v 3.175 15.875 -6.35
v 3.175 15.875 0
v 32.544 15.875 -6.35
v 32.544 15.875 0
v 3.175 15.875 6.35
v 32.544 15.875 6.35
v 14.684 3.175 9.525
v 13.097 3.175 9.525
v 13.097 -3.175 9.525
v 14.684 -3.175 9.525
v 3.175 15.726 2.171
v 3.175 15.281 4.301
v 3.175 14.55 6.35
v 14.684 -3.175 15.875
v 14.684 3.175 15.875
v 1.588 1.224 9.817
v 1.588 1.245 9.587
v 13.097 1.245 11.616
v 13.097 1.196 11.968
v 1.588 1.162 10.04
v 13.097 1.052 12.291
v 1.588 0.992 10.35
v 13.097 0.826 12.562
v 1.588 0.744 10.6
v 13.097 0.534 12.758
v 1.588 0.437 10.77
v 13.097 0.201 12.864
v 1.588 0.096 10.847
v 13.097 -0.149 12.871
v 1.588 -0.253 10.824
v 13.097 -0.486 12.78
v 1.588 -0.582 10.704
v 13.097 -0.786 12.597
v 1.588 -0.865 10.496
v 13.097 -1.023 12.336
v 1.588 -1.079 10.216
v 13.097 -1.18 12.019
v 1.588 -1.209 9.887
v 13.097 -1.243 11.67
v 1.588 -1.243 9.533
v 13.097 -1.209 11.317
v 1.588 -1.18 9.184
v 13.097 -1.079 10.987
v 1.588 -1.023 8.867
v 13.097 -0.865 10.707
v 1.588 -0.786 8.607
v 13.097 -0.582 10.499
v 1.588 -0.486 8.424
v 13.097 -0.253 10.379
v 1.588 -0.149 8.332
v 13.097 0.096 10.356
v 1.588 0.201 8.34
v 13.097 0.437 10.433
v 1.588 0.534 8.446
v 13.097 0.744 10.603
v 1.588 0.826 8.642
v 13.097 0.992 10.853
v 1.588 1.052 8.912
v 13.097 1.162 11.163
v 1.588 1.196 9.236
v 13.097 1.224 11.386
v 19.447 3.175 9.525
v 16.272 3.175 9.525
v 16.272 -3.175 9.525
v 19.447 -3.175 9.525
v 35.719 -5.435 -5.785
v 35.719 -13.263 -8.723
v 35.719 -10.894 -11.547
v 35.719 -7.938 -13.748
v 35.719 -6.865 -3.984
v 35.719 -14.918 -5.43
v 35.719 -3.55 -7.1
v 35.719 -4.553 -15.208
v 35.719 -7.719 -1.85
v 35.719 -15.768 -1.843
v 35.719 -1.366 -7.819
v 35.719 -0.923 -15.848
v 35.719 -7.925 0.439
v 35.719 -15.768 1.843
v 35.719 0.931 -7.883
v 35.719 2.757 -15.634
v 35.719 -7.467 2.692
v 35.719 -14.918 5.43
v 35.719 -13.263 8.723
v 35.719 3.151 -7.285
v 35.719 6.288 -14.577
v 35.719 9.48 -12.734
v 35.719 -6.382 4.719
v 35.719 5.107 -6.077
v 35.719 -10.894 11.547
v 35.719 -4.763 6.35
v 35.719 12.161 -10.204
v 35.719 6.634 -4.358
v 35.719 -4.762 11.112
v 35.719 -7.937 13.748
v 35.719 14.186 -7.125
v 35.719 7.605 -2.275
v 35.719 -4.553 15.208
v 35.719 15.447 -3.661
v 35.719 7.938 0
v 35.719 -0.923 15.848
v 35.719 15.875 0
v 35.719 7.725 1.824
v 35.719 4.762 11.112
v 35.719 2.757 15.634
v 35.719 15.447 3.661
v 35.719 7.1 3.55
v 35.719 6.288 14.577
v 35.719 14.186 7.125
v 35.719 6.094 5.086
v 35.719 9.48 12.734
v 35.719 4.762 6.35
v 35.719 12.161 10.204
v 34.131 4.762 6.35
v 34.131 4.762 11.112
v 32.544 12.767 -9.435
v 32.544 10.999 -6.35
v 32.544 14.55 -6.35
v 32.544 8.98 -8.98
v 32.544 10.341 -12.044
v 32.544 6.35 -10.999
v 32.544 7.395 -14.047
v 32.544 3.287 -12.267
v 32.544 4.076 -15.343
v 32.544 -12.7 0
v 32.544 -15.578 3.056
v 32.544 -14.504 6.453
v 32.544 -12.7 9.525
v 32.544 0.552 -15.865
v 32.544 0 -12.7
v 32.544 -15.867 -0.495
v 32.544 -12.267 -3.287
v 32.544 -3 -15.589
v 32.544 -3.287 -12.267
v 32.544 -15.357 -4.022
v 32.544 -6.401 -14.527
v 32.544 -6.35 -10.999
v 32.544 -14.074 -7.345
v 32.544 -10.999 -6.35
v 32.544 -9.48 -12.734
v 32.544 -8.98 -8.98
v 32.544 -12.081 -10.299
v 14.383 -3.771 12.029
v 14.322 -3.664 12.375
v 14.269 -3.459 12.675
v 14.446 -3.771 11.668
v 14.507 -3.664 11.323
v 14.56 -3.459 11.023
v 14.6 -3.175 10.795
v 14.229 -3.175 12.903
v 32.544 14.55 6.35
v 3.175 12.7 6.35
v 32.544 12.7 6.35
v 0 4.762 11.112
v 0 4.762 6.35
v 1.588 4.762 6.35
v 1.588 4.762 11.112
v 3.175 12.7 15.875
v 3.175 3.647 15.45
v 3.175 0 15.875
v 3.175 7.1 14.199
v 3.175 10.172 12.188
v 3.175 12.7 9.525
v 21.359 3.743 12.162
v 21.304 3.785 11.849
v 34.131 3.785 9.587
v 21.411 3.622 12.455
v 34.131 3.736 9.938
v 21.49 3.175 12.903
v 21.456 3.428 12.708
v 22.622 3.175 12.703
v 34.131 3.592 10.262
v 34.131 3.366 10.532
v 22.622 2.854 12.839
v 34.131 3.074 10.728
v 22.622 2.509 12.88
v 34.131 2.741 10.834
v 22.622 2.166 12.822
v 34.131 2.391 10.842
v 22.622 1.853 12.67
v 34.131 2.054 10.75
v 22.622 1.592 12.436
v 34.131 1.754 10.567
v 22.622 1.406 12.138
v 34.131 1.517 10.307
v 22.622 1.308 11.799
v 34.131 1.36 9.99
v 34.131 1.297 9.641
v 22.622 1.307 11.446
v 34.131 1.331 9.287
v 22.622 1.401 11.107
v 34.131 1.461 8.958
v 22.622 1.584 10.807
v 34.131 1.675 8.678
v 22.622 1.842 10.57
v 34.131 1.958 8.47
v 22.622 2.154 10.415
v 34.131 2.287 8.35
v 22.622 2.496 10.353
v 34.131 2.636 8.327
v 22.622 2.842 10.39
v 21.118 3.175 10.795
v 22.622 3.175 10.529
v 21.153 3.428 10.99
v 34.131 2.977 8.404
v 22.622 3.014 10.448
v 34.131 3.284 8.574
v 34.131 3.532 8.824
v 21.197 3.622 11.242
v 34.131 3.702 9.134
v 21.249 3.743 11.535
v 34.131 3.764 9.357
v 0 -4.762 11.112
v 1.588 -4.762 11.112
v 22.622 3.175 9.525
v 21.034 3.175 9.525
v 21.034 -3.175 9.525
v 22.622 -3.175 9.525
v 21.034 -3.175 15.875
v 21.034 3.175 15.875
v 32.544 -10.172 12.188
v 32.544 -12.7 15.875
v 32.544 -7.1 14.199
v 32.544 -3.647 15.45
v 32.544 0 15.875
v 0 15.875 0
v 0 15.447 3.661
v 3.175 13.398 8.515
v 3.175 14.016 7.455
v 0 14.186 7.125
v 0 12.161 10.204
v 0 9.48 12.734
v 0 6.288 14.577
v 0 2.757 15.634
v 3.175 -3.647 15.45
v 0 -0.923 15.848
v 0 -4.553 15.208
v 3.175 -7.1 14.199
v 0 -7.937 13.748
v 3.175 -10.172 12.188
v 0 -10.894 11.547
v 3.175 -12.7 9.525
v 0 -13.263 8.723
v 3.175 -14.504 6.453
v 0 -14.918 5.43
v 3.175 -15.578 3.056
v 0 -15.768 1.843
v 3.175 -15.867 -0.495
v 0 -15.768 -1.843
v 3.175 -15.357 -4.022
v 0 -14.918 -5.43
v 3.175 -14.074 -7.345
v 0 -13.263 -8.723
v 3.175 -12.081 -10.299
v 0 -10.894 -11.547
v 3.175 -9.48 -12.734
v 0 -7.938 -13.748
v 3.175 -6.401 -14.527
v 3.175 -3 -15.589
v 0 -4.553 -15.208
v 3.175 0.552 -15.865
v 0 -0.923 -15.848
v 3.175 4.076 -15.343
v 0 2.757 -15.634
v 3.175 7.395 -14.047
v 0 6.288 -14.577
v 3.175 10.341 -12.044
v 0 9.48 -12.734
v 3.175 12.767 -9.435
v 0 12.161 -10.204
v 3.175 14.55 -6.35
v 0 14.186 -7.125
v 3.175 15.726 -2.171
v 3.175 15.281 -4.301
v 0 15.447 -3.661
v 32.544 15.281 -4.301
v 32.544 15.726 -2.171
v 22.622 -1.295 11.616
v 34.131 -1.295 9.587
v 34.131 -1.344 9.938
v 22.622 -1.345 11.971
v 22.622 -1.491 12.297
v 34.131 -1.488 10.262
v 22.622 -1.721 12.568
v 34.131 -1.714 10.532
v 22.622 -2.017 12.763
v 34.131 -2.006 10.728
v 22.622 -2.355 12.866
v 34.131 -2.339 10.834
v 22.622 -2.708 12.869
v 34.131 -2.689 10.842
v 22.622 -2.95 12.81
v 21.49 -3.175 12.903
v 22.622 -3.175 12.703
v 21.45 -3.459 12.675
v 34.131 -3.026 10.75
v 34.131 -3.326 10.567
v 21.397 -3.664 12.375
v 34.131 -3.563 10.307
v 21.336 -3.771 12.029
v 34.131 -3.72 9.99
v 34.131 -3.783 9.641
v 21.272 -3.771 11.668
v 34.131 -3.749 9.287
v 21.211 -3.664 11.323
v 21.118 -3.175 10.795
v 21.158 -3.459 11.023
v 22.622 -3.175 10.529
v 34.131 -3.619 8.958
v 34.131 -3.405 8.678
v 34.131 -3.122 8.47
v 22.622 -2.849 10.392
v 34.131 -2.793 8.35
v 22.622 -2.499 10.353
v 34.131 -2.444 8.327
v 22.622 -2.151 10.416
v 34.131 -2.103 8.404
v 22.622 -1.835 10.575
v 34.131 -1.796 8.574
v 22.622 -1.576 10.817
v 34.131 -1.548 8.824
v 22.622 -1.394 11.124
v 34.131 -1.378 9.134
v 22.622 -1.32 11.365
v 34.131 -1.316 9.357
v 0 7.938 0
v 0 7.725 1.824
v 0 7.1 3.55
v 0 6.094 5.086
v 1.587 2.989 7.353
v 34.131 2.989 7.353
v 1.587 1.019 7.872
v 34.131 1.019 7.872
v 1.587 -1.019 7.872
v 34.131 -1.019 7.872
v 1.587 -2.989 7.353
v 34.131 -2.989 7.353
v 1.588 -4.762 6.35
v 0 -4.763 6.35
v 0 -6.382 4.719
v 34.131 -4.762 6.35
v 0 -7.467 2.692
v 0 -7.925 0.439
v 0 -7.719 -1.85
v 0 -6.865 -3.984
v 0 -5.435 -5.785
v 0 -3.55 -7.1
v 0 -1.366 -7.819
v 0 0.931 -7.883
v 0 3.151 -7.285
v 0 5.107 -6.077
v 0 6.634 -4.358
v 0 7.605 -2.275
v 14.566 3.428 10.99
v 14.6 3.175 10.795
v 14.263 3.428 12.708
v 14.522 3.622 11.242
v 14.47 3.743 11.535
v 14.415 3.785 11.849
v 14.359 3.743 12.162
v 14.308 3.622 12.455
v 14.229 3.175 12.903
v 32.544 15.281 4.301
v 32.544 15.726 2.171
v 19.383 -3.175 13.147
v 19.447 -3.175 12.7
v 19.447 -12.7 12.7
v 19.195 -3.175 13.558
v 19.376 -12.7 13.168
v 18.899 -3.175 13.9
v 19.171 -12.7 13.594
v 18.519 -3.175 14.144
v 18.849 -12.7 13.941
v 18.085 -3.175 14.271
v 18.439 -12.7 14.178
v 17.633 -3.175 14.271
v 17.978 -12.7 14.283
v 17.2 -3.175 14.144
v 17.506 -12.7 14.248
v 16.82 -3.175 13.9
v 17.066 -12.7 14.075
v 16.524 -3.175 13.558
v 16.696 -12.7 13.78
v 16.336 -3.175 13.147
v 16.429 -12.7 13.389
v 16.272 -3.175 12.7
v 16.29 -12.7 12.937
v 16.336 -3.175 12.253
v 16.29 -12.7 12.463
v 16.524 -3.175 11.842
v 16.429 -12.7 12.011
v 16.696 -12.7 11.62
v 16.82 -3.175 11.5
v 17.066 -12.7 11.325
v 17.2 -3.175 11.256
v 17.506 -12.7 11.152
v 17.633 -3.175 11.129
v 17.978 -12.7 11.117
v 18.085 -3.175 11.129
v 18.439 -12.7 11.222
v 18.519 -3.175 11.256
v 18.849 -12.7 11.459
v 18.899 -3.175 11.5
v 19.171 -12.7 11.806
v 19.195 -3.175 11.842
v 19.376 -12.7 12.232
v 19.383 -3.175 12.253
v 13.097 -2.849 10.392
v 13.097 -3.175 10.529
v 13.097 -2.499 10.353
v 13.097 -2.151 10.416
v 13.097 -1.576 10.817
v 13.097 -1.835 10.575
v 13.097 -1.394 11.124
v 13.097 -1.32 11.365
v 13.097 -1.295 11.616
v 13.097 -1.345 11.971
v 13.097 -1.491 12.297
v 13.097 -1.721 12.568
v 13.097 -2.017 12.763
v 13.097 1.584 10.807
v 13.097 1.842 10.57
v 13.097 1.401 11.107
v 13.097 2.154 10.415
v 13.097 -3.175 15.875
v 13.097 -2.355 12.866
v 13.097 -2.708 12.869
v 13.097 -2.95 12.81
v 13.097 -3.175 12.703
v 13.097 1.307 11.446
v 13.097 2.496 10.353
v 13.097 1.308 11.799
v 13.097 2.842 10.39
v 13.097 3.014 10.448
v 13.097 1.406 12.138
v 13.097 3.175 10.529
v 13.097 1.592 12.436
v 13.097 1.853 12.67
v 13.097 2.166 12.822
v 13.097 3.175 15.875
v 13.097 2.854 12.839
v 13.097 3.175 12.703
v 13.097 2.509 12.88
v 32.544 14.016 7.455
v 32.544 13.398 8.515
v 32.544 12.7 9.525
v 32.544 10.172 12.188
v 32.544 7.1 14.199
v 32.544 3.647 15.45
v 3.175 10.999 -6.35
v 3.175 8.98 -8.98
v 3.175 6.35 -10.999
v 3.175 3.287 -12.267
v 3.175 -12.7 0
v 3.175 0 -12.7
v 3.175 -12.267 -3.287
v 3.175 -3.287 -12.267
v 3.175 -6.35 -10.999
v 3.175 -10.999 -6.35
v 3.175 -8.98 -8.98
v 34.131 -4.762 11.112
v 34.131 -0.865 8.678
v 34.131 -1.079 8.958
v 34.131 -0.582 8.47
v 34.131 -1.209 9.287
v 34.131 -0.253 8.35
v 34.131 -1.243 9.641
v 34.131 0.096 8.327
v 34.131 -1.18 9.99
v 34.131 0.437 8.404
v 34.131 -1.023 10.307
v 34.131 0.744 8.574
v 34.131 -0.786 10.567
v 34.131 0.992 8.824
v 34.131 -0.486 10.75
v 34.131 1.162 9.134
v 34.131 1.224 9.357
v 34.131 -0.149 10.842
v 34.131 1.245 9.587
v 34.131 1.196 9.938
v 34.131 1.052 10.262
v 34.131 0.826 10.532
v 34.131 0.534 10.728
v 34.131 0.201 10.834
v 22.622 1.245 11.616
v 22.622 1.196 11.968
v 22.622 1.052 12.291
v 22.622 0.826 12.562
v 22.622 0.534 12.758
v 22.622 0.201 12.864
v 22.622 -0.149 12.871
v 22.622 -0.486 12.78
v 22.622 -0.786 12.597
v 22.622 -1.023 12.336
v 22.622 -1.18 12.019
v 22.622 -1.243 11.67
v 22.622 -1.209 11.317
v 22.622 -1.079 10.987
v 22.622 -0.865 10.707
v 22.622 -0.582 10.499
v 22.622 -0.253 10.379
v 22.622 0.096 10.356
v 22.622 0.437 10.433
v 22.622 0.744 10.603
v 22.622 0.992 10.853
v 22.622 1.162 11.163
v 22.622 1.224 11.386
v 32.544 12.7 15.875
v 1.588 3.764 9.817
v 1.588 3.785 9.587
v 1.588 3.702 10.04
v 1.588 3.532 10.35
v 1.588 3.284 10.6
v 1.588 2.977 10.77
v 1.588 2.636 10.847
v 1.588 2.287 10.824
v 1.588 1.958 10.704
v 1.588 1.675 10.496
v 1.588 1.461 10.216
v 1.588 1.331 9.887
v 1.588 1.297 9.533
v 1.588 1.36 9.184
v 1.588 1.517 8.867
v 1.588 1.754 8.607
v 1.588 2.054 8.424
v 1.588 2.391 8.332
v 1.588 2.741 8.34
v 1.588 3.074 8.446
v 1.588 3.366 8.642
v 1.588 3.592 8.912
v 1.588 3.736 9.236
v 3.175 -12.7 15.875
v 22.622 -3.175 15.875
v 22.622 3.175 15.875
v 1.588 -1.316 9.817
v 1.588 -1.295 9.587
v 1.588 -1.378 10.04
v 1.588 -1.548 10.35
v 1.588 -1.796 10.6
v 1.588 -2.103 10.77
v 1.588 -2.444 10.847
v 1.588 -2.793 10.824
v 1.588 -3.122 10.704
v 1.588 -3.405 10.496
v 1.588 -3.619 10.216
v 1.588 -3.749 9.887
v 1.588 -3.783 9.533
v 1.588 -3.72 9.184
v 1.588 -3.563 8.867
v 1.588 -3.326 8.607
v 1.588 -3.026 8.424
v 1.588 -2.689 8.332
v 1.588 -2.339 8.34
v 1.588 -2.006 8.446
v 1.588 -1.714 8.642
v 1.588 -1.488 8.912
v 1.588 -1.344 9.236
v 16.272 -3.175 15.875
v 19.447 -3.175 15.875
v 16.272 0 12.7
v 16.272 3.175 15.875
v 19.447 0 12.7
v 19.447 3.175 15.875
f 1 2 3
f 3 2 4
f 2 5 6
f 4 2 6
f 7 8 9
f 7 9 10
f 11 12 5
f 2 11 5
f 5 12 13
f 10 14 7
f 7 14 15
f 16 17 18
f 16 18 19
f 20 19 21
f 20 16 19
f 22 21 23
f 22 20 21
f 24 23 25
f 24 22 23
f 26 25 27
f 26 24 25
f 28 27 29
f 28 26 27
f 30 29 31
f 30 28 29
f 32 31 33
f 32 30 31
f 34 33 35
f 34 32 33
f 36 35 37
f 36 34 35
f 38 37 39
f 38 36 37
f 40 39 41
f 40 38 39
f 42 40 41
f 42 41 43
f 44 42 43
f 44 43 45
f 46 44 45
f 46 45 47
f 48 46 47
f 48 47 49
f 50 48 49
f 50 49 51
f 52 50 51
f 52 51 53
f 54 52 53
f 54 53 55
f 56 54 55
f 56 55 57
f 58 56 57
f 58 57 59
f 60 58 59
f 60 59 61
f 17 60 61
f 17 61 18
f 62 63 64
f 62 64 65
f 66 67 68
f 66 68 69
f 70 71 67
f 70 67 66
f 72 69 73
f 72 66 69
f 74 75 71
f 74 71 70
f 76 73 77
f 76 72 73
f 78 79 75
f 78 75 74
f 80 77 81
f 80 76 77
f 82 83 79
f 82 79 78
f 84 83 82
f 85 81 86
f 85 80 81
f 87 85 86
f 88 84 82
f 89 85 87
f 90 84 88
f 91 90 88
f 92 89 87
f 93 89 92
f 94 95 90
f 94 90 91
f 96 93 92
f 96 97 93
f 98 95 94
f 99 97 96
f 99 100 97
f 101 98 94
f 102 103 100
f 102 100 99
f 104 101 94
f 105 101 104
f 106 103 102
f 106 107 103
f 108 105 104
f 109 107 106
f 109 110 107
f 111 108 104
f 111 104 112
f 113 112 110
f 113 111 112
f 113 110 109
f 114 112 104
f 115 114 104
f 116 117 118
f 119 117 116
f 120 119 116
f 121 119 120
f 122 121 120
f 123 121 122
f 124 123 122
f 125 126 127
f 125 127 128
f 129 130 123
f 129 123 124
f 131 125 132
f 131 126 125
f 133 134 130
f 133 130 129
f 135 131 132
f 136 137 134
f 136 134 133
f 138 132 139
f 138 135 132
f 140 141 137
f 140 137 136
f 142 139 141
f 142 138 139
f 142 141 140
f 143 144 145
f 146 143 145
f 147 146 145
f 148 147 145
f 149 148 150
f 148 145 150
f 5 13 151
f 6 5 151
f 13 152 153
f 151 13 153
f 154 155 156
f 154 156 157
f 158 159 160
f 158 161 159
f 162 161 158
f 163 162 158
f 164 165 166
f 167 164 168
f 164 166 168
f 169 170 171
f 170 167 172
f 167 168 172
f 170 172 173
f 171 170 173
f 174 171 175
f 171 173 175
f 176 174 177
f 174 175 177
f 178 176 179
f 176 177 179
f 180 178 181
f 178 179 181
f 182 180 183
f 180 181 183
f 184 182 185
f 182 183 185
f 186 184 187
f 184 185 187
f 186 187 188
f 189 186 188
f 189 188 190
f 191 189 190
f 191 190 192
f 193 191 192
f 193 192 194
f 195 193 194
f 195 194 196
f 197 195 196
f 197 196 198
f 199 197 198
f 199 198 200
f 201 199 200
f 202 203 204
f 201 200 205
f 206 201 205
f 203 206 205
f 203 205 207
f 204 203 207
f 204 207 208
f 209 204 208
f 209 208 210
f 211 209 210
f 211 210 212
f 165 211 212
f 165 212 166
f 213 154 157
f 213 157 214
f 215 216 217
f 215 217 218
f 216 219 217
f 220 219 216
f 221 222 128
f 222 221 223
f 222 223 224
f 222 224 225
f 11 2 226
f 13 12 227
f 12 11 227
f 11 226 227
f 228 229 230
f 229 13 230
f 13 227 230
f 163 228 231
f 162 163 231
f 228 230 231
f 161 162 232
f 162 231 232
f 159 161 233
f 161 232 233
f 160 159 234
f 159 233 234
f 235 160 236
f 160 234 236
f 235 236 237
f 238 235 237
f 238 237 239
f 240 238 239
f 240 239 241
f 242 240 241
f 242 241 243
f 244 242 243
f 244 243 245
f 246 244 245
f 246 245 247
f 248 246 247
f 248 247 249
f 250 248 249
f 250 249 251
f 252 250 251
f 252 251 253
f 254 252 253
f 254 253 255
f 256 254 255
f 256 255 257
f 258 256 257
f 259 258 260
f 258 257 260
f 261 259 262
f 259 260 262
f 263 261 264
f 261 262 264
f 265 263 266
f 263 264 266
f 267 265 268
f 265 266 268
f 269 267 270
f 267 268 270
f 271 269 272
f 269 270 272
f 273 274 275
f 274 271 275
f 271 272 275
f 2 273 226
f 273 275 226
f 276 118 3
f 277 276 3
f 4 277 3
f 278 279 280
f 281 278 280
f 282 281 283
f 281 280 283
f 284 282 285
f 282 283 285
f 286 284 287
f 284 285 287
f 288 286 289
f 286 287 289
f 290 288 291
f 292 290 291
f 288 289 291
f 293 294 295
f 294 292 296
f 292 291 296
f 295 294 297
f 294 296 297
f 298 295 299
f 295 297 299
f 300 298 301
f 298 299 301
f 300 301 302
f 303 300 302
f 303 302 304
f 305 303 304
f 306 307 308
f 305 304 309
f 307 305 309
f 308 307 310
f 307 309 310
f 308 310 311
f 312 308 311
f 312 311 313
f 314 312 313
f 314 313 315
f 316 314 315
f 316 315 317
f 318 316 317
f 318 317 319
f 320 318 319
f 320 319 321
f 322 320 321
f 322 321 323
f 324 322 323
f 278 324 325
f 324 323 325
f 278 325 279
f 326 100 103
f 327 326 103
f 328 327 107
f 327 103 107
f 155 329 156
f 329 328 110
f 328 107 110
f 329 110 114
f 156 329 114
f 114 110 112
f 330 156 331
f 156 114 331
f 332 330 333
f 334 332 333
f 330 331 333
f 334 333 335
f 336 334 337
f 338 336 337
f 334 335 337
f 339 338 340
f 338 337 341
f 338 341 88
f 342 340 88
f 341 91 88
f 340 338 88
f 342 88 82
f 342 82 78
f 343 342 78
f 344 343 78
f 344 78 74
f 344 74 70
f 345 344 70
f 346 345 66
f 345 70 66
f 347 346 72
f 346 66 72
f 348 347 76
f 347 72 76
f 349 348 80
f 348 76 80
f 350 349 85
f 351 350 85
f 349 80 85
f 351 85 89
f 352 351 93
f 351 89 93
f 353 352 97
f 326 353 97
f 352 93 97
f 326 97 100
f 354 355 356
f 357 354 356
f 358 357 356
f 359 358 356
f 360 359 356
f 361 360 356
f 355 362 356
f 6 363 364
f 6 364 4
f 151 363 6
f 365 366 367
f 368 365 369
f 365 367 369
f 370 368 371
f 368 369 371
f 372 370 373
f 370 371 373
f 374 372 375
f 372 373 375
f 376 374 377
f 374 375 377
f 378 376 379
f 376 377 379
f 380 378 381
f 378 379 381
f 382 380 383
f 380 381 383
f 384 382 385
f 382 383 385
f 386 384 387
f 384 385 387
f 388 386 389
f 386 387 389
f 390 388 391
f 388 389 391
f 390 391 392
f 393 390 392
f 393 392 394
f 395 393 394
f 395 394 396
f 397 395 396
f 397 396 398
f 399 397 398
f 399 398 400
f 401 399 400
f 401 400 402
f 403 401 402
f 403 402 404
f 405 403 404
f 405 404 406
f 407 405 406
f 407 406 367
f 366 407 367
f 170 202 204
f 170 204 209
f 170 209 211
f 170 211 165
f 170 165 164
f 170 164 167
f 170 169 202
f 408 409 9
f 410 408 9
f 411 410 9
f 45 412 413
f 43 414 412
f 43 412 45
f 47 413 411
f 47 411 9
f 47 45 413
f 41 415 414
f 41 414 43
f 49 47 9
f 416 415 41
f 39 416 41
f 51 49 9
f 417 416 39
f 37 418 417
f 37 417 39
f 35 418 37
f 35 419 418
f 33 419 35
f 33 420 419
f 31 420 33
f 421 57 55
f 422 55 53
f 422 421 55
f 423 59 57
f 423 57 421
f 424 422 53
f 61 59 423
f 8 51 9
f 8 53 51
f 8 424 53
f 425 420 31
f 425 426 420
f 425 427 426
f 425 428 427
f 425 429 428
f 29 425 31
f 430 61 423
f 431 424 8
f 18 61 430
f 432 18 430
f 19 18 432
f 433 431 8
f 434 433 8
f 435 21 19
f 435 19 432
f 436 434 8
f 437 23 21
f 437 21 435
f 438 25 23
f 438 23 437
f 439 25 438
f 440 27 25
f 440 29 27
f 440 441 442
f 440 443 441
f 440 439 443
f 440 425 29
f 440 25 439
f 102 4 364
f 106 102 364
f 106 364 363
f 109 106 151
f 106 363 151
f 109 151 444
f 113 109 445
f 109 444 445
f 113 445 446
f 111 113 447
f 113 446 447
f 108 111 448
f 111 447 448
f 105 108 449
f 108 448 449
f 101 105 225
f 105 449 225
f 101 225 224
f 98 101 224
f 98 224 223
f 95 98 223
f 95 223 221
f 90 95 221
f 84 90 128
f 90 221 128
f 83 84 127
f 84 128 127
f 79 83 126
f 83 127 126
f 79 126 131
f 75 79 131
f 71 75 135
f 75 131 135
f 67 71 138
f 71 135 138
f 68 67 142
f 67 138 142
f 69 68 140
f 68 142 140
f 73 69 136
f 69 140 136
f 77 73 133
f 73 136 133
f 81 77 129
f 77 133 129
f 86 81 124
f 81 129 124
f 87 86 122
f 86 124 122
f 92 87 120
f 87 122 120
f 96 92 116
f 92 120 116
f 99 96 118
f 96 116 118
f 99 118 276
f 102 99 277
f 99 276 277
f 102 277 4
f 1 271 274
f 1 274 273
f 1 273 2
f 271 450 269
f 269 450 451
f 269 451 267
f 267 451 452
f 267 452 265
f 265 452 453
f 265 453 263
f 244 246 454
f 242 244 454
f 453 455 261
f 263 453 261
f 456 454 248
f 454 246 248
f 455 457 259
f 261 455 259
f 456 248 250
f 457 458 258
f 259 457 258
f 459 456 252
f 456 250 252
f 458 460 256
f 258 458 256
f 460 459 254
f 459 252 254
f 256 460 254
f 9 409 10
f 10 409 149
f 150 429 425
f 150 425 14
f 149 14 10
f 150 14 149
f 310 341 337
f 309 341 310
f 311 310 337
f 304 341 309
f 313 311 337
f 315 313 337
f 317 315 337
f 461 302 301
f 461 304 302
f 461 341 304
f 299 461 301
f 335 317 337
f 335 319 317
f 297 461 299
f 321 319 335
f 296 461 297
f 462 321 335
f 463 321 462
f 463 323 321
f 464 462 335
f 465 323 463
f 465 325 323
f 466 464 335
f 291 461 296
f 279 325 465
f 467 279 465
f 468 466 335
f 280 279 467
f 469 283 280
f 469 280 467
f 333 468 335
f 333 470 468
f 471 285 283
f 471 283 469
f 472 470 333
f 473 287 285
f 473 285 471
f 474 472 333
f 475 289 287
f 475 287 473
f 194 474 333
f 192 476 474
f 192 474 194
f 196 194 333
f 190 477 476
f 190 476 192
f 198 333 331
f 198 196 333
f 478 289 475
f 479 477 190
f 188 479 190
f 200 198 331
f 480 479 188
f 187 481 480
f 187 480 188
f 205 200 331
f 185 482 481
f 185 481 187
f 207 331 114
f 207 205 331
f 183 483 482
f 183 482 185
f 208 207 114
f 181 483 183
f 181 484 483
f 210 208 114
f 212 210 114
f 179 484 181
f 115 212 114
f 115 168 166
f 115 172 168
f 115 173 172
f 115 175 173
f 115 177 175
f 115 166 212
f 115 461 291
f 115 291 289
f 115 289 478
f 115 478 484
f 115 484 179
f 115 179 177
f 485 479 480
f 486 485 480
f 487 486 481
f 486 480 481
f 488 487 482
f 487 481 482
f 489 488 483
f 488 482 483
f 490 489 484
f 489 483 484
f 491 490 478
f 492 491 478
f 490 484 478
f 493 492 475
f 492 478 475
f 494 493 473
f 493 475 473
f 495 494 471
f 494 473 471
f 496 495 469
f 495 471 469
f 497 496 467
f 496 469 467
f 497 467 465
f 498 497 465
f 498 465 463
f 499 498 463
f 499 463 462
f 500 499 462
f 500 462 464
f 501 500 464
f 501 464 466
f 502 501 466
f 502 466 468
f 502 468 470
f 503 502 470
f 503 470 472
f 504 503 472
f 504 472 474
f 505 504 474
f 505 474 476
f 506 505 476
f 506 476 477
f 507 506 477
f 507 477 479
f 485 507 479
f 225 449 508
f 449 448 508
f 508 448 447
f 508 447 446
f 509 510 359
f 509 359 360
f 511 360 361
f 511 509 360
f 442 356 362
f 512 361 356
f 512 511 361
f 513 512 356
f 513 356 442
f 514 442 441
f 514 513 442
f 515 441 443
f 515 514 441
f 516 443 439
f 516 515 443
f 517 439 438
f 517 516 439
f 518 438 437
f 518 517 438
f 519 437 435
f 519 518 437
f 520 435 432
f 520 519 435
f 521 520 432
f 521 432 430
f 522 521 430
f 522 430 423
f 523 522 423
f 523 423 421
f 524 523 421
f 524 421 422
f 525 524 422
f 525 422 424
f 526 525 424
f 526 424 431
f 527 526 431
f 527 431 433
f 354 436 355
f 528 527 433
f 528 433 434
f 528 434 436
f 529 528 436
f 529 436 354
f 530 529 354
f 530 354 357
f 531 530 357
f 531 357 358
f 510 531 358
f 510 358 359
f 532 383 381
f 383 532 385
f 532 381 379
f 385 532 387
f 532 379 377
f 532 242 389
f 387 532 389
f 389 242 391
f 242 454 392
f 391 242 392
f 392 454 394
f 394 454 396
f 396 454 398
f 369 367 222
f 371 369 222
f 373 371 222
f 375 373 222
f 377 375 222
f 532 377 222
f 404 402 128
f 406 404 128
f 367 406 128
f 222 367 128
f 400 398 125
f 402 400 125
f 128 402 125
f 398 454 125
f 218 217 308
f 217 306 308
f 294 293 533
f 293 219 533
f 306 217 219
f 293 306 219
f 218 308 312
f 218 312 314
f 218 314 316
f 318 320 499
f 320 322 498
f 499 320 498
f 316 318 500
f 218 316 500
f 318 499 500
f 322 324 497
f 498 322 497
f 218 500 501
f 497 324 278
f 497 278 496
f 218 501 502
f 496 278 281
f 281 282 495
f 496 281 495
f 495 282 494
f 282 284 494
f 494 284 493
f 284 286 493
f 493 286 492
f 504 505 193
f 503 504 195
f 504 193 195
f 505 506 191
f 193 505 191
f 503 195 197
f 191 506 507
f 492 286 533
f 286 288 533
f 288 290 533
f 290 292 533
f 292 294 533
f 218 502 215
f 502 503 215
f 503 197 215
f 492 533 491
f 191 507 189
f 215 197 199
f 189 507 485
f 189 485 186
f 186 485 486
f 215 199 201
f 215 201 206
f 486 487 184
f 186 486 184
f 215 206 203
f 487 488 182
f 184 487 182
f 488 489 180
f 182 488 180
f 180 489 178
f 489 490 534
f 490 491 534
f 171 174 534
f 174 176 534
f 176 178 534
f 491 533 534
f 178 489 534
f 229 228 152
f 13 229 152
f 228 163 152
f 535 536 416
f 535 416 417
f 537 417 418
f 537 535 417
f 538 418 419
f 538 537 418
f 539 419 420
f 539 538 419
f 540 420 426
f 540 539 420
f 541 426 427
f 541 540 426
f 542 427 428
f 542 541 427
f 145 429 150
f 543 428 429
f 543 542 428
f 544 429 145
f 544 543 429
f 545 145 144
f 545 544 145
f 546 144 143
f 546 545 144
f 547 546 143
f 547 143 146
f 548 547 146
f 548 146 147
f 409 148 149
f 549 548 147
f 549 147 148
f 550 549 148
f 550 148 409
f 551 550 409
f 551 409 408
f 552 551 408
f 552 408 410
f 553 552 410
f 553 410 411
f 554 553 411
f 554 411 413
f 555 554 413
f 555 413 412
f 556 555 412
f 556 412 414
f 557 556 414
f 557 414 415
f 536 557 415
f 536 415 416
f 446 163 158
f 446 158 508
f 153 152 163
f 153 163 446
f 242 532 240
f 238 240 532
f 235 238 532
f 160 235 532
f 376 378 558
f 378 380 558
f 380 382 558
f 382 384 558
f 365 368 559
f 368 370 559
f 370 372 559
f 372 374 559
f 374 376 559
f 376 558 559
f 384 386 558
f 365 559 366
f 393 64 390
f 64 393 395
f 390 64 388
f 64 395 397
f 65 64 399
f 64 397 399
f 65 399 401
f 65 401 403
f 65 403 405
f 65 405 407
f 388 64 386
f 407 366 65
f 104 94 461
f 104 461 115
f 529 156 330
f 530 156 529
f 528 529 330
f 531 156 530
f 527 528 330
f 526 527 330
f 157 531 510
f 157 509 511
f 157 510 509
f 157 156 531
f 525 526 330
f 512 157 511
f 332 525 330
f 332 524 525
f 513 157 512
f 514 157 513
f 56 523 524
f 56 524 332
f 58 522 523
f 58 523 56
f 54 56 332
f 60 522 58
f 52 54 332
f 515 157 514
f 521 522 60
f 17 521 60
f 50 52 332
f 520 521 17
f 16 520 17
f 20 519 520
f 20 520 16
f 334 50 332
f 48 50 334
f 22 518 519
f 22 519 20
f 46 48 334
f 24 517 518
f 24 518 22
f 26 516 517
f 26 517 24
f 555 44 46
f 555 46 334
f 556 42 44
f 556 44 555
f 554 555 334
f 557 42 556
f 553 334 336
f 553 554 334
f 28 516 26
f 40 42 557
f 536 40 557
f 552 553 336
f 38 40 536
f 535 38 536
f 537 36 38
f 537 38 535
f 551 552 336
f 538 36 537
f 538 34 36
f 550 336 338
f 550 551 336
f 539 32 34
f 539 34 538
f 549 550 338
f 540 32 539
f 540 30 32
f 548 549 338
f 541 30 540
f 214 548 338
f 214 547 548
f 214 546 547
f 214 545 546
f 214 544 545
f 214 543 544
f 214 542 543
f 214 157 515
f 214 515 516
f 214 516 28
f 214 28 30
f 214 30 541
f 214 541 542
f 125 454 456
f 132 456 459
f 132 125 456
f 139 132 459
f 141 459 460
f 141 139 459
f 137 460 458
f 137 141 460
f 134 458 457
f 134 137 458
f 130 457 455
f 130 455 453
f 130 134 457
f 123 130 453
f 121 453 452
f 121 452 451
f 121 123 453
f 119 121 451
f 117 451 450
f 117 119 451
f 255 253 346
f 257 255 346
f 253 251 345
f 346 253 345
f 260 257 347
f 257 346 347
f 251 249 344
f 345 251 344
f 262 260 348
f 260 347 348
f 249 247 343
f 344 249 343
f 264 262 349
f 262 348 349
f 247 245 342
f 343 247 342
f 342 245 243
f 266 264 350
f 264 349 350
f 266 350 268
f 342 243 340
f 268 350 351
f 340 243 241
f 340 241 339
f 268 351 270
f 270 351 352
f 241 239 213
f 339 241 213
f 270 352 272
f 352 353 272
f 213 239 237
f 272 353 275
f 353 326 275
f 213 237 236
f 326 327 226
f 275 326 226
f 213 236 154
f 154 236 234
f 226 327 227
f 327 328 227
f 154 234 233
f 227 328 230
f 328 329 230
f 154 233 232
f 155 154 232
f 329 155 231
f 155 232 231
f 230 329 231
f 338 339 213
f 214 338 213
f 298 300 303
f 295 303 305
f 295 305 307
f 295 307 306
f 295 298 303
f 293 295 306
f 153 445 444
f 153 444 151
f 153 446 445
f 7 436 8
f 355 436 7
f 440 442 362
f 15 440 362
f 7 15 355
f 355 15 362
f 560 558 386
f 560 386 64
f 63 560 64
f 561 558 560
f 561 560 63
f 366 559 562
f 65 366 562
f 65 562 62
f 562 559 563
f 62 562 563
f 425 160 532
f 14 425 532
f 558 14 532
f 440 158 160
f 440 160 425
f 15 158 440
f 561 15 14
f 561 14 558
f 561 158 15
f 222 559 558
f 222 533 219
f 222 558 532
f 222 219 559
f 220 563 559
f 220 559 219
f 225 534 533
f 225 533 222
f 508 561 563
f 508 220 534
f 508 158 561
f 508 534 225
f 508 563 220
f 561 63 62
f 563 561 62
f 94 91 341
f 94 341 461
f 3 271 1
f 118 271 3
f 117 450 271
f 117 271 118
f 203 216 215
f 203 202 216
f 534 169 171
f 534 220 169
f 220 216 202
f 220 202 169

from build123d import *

# Parameters (mm, degrees)
F0_R      = 15.875
F1_DEPTH  = 35.71875
F2_W      = 29.36875
F2_H      = 3.175
F4_W      = 29.36875
F4_H      = 25.4
F5_DEPTH  = 15.875
F6_W      = 29.36875
F6_H      = 12.7
F7_DEPTH  = 15.875
F8_R      = 7.9375
F9_DEPTH  = 35.71975
F10_W     = 1.5875
F10_H     = 6.35
F10_W_2   = 3.175
F11_DEPTH = 6.35
F12_R     = 1.5875
F13_DEPTH = 12.7
F15_W     = 9.525
F15_H     = 6.0325
F16_DEPTH = 1.5875
F17_W     = 9.525
F17_H     = 6.0325
F18_DEPTH = 1.5875
F22_R     = 1.2446
F23_DEPTH = 13.97
F27_R     = 1.2446
F28_DEPTH = 13.97


with BuildPart() as f1:
    # F0 (on Right) → F1 (new body)
    with BuildSketch(Plane.YZ):
        Circle(F0_R)
    extrude(amount=F1_DEPTH)

    # F2 (on Front) → F3 (revolve, cut)
    with BuildSketch(Plane.XZ):
        with Locations((17.859375, 14.2875)):
            Rectangle(F2_W, F2_H)
    revolve(axis=Axis((19.161431, 0, 0), (1, 0, 0)), mode=Mode.SUBTRACT)

    # F4 (on Top) → F5 (join)
    with BuildSketch(Plane.XY):
        with Locations((17.859375, 0)):
            Rectangle(F4_W, F4_H)
    extrude(amount=F5_DEPTH)

    # F6 (on Front) → F7 (join)
    with BuildSketch(Plane.XZ):
        with Locations((17.859375, 0)):
            Rectangle(F6_W, F6_H)
    extrude(amount=-F7_DEPTH)

    # F8 (on face) → F9 (cut, through all)
    with BuildSketch(Plane.YZ.offset(35.71875)):
        Circle(F8_R)
    extrude(amount=-F9_DEPTH, mode=Mode.SUBTRACT)

    # F10 (on face) → F11 (cut)
    with BuildSketch(Plane.XY.offset(15.875)):
        with Locations((13.890625, 0)):
            Rectangle(F10_W, F10_H)
        with Locations((17.859375, 0)):
            Rectangle(F10_W_2, F10_H)
        with Locations((21.828125, 0)):
            Rectangle(F10_W, F10_H)
    extrude(amount=-F11_DEPTH, mode=Mode.SUBTRACT)

    # F12 (on face) → F13 (cut)
    with BuildSketch(Plane.XZ.offset(12.7)):
        with Locations((17.859375, 12.7)):
            Circle(F12_R)
    extrude(amount=-F13_DEPTH, mode=Mode.SUBTRACT)

    # F15 (on face) → F16 (cut)
    with BuildSketch(Plane.YZ.offset(35.71875)):
        with Locations((0, 8.09625)):
            Rectangle(F15_W, F15_H)
    extrude(amount=-F16_DEPTH, mode=Mode.SUBTRACT)

    # F17 (on face) → F18 (cut)
    with BuildSketch(Plane(origin=(0, 0, 0), x_dir=(0, -1, 0), z_dir=(-1, 0, 0))):
        with Locations((0, 8.09625)):
            Rectangle(F17_W, F17_H)
    extrude(amount=-F18_DEPTH, mode=Mode.SUBTRACT)

    # F22 (on face) → F23 (cut)
    with BuildSketch(Plane(origin=(32.393255, 0, -5.711805), x_dir=(0, 1, 0), z_dir=(0.984808, 0, -0.173648))):
        with Locations((2.54, 15.368172)):
            Circle(F22_R)
        with Locations((0, 15.368172)):
            Circle(F22_R)
        with Locations((-2.54, 15.368172)):
            Circle(F22_R)
    extrude(amount=-F23_DEPTH, mode=Mode.SUBTRACT)

    # F27 (on face) → F28 (cut)
    with BuildSketch(Plane(origin=(2.248443, 0, 0.396461), x_dir=(0, 1, 0), z_dir=(0.984808, 0, 0.173648))):
        with Locations((2.54, 9.165676)):
            Circle(F27_R)
        with Locations((-2.54, 9.165676)):
            Circle(F27_R)
        with Locations((0, 9.165676)):
            Circle(F27_R)
    extrude(amount=F28_DEPTH, mode=Mode.SUBTRACT)


solid = f1.part
